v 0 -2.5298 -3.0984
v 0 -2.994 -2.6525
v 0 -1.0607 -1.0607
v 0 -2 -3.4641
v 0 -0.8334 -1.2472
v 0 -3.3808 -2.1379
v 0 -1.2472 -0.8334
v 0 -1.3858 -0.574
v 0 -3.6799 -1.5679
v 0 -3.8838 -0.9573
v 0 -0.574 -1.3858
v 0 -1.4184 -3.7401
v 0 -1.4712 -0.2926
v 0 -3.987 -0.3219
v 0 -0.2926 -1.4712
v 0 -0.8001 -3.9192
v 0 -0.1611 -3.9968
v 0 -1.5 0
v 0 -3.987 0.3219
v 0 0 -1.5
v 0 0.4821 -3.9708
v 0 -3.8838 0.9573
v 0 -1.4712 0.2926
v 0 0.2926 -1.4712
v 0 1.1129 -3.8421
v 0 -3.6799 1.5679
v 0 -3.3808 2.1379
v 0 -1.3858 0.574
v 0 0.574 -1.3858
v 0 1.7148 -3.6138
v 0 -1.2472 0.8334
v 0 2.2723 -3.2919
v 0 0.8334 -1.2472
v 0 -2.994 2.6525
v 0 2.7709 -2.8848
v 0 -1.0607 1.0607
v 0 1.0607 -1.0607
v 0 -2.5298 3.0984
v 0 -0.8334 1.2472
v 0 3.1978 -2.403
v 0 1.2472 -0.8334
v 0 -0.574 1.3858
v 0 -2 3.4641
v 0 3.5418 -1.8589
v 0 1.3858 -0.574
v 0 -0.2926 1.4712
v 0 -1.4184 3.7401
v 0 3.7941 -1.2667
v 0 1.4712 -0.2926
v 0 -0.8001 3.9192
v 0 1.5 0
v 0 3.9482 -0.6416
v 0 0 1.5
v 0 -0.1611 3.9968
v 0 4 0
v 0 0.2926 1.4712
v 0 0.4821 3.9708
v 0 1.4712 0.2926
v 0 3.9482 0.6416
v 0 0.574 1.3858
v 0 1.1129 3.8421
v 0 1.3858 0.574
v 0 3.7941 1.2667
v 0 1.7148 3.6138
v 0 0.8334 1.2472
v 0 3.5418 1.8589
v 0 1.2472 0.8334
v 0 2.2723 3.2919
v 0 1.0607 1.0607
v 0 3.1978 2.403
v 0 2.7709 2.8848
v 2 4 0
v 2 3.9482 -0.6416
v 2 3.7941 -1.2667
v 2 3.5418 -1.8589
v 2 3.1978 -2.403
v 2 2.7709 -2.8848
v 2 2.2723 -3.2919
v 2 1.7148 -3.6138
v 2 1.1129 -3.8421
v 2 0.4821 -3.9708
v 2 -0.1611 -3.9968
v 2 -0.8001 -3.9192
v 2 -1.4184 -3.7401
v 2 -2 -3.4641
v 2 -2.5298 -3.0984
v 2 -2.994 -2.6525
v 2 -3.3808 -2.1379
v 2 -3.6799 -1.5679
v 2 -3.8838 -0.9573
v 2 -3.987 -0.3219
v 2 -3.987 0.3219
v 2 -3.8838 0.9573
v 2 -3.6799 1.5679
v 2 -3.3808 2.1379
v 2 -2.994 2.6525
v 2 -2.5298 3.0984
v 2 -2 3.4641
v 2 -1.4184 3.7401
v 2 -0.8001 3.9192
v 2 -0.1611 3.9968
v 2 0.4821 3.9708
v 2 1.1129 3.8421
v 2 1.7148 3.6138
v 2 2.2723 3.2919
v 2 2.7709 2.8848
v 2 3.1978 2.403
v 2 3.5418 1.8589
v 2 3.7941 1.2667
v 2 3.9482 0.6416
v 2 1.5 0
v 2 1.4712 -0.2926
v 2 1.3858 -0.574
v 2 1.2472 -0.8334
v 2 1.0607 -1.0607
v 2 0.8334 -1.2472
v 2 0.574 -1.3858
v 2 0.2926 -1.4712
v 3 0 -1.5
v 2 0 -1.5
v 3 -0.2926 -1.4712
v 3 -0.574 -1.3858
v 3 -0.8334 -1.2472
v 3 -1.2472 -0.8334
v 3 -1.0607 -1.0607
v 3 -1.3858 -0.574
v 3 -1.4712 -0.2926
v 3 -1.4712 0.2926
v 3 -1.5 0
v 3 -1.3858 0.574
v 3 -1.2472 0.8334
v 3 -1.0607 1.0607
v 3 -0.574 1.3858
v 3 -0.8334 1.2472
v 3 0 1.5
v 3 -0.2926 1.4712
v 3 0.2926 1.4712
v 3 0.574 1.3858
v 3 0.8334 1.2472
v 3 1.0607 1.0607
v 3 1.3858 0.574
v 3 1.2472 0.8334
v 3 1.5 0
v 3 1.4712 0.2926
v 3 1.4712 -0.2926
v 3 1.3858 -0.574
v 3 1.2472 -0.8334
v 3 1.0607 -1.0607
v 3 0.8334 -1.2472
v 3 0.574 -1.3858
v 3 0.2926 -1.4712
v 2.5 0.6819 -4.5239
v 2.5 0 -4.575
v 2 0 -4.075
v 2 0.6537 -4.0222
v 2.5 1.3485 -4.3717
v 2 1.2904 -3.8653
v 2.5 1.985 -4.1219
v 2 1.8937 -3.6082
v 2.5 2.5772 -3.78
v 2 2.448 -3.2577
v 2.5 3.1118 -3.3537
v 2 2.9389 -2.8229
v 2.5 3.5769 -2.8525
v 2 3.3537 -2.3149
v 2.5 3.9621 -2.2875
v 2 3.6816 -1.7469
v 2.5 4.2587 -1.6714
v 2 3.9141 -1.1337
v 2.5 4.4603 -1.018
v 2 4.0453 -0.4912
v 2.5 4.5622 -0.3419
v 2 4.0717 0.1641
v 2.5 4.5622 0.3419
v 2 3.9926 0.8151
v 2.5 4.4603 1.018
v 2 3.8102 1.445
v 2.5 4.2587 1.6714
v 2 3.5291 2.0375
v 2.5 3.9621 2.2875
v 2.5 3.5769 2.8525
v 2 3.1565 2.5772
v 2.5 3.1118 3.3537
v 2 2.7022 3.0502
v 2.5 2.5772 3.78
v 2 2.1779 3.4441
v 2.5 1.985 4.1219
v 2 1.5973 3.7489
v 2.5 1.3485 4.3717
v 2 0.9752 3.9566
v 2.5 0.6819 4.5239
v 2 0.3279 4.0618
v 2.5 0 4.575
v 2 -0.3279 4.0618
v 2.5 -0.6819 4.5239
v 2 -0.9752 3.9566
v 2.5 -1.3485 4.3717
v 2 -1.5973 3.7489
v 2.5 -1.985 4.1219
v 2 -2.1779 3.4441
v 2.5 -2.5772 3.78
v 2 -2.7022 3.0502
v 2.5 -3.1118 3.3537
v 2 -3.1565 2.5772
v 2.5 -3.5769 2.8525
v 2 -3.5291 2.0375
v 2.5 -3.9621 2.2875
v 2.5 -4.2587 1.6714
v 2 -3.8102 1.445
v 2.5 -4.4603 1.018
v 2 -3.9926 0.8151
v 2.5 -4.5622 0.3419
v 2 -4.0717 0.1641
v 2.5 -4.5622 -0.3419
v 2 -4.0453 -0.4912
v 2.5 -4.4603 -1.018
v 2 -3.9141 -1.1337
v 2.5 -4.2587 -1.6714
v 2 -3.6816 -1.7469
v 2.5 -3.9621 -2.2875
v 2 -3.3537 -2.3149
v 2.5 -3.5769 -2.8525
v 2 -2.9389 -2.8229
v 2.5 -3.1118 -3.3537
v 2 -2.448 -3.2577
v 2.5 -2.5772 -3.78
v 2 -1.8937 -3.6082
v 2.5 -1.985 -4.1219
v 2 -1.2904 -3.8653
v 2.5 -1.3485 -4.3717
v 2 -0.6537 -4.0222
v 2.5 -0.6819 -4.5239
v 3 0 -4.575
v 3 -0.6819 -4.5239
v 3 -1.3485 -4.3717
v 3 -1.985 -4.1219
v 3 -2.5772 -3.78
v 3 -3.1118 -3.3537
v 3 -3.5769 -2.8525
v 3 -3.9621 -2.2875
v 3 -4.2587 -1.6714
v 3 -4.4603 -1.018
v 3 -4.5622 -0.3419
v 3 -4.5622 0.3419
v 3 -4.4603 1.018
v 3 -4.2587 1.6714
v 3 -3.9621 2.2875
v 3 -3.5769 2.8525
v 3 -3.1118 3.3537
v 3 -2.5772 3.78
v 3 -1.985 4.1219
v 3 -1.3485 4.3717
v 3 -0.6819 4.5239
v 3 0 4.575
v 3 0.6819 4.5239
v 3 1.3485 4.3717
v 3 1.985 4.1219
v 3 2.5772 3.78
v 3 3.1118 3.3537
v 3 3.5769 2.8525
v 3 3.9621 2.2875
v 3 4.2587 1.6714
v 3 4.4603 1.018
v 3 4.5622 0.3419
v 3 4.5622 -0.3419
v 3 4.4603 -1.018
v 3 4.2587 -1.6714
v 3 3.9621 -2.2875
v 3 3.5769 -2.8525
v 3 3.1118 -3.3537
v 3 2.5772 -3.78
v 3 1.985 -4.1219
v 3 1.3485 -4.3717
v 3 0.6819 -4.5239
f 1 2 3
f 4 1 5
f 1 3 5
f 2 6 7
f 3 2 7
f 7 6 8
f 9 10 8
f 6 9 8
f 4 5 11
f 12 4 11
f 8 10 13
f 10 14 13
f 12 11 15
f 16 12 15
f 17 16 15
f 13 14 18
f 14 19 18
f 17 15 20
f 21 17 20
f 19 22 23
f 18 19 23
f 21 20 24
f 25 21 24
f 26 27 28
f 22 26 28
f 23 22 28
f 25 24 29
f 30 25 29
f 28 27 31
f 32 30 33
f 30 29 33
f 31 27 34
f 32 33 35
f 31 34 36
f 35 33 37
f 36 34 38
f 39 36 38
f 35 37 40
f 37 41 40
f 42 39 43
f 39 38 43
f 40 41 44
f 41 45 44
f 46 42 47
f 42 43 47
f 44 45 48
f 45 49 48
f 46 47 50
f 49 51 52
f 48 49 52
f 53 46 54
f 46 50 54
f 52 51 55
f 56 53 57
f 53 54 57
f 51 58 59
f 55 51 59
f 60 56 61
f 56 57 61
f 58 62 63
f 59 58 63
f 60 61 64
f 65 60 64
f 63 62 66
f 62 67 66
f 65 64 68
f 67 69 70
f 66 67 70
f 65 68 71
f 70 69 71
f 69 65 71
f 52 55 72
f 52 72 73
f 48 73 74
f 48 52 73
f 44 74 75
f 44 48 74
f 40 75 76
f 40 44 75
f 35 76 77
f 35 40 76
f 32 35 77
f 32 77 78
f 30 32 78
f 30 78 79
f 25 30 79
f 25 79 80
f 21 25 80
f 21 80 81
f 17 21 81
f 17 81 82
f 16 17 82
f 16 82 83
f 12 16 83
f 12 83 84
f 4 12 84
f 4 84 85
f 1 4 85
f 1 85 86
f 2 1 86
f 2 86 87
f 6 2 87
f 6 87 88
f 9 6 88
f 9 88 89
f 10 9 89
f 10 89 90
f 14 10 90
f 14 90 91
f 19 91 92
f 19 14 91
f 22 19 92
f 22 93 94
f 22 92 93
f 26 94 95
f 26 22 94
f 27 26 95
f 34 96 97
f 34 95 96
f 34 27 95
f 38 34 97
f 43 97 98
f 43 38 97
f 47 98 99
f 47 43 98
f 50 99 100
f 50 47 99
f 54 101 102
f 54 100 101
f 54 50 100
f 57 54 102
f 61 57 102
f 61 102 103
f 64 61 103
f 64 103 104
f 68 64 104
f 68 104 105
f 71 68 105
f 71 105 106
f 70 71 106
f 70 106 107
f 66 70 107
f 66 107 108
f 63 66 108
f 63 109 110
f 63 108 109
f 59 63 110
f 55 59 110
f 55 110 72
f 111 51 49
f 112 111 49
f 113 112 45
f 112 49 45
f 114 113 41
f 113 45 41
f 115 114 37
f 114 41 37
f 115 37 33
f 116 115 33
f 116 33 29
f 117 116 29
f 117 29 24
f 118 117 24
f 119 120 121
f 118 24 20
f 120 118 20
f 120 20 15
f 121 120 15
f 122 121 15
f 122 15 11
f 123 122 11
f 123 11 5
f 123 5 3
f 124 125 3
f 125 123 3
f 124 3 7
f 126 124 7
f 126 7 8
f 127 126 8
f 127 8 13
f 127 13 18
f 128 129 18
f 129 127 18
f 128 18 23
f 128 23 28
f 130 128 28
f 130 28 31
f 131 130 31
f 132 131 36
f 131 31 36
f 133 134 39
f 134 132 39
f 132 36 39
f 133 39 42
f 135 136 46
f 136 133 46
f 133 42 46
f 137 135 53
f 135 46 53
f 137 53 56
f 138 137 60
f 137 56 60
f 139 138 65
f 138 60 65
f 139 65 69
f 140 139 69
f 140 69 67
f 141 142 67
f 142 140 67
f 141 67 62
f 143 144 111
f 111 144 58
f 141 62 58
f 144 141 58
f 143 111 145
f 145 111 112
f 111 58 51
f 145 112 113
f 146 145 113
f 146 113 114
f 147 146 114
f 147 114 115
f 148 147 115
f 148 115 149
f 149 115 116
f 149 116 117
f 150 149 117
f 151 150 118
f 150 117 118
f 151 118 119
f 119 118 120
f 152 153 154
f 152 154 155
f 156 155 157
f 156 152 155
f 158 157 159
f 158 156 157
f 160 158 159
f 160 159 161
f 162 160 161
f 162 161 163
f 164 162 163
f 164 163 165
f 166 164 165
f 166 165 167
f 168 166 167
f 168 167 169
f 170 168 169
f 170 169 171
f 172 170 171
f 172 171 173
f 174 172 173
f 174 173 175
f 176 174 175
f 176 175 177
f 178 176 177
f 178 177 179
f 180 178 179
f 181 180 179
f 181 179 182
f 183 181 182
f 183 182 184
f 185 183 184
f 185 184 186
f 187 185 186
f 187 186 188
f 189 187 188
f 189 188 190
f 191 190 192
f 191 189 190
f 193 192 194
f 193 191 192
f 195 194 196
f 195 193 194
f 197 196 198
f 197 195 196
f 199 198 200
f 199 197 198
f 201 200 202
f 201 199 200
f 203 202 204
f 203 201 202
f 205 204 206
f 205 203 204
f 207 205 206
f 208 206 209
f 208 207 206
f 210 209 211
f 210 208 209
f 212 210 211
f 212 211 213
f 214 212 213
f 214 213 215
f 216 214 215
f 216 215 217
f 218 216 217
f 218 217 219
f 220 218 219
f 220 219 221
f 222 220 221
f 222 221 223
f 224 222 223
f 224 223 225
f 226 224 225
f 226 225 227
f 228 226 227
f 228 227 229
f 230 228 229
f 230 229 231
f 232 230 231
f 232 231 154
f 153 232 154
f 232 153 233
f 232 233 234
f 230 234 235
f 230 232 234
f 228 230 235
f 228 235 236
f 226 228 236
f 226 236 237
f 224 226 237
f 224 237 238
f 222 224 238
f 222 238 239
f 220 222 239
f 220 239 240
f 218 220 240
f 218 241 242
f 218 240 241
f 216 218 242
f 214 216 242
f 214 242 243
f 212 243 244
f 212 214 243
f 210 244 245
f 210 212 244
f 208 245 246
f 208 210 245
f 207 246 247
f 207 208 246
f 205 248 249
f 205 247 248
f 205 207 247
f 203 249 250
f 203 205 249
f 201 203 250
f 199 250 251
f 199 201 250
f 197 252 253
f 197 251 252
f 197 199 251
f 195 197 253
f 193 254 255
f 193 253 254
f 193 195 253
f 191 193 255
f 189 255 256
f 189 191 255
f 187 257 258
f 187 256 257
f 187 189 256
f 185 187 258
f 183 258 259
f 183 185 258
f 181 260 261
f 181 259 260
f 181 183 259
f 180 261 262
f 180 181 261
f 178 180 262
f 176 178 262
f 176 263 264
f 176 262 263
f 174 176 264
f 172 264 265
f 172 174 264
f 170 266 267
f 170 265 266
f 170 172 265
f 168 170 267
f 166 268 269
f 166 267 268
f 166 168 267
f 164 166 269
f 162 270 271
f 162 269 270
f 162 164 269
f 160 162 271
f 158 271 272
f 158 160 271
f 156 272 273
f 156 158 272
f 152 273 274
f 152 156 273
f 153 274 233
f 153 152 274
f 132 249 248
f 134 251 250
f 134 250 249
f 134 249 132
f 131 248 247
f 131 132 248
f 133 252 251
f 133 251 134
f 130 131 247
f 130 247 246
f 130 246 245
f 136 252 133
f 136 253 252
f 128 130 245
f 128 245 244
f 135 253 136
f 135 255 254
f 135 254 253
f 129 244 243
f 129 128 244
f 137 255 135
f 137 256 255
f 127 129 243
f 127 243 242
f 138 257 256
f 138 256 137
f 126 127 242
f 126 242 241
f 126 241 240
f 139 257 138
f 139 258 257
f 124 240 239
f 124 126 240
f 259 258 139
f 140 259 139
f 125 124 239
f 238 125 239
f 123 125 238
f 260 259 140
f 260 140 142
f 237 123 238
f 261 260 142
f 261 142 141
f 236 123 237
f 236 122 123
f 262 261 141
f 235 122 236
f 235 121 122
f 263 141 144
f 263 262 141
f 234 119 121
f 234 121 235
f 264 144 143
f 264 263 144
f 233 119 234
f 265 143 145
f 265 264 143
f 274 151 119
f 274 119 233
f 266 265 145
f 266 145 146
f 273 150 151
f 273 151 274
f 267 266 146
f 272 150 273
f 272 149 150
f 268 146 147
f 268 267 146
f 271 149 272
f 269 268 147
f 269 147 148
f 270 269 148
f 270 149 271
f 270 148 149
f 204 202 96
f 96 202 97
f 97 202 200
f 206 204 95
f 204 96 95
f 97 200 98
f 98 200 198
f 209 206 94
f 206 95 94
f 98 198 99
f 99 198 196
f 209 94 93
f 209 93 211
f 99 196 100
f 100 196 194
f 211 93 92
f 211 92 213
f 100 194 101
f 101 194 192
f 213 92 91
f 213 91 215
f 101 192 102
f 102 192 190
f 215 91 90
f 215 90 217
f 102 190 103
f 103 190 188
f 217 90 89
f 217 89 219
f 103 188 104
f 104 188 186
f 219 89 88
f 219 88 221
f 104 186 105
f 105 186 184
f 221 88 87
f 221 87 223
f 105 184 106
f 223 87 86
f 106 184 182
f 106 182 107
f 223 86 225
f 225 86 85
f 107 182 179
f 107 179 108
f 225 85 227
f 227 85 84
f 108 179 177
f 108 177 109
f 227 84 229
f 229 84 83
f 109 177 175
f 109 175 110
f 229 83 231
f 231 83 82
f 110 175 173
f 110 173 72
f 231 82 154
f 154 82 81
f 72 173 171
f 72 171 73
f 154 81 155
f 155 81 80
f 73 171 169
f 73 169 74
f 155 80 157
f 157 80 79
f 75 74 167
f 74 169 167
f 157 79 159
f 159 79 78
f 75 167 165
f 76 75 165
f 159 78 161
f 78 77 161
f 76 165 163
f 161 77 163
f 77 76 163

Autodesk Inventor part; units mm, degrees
ref_plane "YZ Plane" through (0, 0, 0) normal (1, 0, 0) x (0, 1, 0)
ref_plane "XZ Plane" through (0, 0, 0) normal (0, 1, 0) x (-1, 0, 0)
ref_plane "XY Plane" through (0, 0, 0) normal (0, 0, 1) x (1, 0, 0)
sketch "Skizze1" plane through (0, 0, 0) normal (1, 0, 0) x (0, 1, 0)
  circle A0 centre (0, 0) radius 4
  circle A1 centre (0, 0) radius 1.5
  dimension "d0" = 8
  dimension "d1" = 3
extrude "Extrusion1" add sketch "Skizze1" along normal blind 2
sketch "Skizze2" plane through (2, 0, 0) normal (1, 0, 0) x (0, 0, -1)
  circle A0 centre (0, 0) radius 4 projected
  circle A1 centre (0, 0) radius 1.5 projected
  circle A2 centre (0, 0) radius 4.575
  dimension "d4" = 9.15
extrude "Extrusion2" add sketch "Skizze2" along normal blind 1 contours A0 | A2
chamfer "Fase1" distance 0.5 angle 45 1 edges at (2, 0, 4.575)
properties part number "00_Bearing_8mm"
